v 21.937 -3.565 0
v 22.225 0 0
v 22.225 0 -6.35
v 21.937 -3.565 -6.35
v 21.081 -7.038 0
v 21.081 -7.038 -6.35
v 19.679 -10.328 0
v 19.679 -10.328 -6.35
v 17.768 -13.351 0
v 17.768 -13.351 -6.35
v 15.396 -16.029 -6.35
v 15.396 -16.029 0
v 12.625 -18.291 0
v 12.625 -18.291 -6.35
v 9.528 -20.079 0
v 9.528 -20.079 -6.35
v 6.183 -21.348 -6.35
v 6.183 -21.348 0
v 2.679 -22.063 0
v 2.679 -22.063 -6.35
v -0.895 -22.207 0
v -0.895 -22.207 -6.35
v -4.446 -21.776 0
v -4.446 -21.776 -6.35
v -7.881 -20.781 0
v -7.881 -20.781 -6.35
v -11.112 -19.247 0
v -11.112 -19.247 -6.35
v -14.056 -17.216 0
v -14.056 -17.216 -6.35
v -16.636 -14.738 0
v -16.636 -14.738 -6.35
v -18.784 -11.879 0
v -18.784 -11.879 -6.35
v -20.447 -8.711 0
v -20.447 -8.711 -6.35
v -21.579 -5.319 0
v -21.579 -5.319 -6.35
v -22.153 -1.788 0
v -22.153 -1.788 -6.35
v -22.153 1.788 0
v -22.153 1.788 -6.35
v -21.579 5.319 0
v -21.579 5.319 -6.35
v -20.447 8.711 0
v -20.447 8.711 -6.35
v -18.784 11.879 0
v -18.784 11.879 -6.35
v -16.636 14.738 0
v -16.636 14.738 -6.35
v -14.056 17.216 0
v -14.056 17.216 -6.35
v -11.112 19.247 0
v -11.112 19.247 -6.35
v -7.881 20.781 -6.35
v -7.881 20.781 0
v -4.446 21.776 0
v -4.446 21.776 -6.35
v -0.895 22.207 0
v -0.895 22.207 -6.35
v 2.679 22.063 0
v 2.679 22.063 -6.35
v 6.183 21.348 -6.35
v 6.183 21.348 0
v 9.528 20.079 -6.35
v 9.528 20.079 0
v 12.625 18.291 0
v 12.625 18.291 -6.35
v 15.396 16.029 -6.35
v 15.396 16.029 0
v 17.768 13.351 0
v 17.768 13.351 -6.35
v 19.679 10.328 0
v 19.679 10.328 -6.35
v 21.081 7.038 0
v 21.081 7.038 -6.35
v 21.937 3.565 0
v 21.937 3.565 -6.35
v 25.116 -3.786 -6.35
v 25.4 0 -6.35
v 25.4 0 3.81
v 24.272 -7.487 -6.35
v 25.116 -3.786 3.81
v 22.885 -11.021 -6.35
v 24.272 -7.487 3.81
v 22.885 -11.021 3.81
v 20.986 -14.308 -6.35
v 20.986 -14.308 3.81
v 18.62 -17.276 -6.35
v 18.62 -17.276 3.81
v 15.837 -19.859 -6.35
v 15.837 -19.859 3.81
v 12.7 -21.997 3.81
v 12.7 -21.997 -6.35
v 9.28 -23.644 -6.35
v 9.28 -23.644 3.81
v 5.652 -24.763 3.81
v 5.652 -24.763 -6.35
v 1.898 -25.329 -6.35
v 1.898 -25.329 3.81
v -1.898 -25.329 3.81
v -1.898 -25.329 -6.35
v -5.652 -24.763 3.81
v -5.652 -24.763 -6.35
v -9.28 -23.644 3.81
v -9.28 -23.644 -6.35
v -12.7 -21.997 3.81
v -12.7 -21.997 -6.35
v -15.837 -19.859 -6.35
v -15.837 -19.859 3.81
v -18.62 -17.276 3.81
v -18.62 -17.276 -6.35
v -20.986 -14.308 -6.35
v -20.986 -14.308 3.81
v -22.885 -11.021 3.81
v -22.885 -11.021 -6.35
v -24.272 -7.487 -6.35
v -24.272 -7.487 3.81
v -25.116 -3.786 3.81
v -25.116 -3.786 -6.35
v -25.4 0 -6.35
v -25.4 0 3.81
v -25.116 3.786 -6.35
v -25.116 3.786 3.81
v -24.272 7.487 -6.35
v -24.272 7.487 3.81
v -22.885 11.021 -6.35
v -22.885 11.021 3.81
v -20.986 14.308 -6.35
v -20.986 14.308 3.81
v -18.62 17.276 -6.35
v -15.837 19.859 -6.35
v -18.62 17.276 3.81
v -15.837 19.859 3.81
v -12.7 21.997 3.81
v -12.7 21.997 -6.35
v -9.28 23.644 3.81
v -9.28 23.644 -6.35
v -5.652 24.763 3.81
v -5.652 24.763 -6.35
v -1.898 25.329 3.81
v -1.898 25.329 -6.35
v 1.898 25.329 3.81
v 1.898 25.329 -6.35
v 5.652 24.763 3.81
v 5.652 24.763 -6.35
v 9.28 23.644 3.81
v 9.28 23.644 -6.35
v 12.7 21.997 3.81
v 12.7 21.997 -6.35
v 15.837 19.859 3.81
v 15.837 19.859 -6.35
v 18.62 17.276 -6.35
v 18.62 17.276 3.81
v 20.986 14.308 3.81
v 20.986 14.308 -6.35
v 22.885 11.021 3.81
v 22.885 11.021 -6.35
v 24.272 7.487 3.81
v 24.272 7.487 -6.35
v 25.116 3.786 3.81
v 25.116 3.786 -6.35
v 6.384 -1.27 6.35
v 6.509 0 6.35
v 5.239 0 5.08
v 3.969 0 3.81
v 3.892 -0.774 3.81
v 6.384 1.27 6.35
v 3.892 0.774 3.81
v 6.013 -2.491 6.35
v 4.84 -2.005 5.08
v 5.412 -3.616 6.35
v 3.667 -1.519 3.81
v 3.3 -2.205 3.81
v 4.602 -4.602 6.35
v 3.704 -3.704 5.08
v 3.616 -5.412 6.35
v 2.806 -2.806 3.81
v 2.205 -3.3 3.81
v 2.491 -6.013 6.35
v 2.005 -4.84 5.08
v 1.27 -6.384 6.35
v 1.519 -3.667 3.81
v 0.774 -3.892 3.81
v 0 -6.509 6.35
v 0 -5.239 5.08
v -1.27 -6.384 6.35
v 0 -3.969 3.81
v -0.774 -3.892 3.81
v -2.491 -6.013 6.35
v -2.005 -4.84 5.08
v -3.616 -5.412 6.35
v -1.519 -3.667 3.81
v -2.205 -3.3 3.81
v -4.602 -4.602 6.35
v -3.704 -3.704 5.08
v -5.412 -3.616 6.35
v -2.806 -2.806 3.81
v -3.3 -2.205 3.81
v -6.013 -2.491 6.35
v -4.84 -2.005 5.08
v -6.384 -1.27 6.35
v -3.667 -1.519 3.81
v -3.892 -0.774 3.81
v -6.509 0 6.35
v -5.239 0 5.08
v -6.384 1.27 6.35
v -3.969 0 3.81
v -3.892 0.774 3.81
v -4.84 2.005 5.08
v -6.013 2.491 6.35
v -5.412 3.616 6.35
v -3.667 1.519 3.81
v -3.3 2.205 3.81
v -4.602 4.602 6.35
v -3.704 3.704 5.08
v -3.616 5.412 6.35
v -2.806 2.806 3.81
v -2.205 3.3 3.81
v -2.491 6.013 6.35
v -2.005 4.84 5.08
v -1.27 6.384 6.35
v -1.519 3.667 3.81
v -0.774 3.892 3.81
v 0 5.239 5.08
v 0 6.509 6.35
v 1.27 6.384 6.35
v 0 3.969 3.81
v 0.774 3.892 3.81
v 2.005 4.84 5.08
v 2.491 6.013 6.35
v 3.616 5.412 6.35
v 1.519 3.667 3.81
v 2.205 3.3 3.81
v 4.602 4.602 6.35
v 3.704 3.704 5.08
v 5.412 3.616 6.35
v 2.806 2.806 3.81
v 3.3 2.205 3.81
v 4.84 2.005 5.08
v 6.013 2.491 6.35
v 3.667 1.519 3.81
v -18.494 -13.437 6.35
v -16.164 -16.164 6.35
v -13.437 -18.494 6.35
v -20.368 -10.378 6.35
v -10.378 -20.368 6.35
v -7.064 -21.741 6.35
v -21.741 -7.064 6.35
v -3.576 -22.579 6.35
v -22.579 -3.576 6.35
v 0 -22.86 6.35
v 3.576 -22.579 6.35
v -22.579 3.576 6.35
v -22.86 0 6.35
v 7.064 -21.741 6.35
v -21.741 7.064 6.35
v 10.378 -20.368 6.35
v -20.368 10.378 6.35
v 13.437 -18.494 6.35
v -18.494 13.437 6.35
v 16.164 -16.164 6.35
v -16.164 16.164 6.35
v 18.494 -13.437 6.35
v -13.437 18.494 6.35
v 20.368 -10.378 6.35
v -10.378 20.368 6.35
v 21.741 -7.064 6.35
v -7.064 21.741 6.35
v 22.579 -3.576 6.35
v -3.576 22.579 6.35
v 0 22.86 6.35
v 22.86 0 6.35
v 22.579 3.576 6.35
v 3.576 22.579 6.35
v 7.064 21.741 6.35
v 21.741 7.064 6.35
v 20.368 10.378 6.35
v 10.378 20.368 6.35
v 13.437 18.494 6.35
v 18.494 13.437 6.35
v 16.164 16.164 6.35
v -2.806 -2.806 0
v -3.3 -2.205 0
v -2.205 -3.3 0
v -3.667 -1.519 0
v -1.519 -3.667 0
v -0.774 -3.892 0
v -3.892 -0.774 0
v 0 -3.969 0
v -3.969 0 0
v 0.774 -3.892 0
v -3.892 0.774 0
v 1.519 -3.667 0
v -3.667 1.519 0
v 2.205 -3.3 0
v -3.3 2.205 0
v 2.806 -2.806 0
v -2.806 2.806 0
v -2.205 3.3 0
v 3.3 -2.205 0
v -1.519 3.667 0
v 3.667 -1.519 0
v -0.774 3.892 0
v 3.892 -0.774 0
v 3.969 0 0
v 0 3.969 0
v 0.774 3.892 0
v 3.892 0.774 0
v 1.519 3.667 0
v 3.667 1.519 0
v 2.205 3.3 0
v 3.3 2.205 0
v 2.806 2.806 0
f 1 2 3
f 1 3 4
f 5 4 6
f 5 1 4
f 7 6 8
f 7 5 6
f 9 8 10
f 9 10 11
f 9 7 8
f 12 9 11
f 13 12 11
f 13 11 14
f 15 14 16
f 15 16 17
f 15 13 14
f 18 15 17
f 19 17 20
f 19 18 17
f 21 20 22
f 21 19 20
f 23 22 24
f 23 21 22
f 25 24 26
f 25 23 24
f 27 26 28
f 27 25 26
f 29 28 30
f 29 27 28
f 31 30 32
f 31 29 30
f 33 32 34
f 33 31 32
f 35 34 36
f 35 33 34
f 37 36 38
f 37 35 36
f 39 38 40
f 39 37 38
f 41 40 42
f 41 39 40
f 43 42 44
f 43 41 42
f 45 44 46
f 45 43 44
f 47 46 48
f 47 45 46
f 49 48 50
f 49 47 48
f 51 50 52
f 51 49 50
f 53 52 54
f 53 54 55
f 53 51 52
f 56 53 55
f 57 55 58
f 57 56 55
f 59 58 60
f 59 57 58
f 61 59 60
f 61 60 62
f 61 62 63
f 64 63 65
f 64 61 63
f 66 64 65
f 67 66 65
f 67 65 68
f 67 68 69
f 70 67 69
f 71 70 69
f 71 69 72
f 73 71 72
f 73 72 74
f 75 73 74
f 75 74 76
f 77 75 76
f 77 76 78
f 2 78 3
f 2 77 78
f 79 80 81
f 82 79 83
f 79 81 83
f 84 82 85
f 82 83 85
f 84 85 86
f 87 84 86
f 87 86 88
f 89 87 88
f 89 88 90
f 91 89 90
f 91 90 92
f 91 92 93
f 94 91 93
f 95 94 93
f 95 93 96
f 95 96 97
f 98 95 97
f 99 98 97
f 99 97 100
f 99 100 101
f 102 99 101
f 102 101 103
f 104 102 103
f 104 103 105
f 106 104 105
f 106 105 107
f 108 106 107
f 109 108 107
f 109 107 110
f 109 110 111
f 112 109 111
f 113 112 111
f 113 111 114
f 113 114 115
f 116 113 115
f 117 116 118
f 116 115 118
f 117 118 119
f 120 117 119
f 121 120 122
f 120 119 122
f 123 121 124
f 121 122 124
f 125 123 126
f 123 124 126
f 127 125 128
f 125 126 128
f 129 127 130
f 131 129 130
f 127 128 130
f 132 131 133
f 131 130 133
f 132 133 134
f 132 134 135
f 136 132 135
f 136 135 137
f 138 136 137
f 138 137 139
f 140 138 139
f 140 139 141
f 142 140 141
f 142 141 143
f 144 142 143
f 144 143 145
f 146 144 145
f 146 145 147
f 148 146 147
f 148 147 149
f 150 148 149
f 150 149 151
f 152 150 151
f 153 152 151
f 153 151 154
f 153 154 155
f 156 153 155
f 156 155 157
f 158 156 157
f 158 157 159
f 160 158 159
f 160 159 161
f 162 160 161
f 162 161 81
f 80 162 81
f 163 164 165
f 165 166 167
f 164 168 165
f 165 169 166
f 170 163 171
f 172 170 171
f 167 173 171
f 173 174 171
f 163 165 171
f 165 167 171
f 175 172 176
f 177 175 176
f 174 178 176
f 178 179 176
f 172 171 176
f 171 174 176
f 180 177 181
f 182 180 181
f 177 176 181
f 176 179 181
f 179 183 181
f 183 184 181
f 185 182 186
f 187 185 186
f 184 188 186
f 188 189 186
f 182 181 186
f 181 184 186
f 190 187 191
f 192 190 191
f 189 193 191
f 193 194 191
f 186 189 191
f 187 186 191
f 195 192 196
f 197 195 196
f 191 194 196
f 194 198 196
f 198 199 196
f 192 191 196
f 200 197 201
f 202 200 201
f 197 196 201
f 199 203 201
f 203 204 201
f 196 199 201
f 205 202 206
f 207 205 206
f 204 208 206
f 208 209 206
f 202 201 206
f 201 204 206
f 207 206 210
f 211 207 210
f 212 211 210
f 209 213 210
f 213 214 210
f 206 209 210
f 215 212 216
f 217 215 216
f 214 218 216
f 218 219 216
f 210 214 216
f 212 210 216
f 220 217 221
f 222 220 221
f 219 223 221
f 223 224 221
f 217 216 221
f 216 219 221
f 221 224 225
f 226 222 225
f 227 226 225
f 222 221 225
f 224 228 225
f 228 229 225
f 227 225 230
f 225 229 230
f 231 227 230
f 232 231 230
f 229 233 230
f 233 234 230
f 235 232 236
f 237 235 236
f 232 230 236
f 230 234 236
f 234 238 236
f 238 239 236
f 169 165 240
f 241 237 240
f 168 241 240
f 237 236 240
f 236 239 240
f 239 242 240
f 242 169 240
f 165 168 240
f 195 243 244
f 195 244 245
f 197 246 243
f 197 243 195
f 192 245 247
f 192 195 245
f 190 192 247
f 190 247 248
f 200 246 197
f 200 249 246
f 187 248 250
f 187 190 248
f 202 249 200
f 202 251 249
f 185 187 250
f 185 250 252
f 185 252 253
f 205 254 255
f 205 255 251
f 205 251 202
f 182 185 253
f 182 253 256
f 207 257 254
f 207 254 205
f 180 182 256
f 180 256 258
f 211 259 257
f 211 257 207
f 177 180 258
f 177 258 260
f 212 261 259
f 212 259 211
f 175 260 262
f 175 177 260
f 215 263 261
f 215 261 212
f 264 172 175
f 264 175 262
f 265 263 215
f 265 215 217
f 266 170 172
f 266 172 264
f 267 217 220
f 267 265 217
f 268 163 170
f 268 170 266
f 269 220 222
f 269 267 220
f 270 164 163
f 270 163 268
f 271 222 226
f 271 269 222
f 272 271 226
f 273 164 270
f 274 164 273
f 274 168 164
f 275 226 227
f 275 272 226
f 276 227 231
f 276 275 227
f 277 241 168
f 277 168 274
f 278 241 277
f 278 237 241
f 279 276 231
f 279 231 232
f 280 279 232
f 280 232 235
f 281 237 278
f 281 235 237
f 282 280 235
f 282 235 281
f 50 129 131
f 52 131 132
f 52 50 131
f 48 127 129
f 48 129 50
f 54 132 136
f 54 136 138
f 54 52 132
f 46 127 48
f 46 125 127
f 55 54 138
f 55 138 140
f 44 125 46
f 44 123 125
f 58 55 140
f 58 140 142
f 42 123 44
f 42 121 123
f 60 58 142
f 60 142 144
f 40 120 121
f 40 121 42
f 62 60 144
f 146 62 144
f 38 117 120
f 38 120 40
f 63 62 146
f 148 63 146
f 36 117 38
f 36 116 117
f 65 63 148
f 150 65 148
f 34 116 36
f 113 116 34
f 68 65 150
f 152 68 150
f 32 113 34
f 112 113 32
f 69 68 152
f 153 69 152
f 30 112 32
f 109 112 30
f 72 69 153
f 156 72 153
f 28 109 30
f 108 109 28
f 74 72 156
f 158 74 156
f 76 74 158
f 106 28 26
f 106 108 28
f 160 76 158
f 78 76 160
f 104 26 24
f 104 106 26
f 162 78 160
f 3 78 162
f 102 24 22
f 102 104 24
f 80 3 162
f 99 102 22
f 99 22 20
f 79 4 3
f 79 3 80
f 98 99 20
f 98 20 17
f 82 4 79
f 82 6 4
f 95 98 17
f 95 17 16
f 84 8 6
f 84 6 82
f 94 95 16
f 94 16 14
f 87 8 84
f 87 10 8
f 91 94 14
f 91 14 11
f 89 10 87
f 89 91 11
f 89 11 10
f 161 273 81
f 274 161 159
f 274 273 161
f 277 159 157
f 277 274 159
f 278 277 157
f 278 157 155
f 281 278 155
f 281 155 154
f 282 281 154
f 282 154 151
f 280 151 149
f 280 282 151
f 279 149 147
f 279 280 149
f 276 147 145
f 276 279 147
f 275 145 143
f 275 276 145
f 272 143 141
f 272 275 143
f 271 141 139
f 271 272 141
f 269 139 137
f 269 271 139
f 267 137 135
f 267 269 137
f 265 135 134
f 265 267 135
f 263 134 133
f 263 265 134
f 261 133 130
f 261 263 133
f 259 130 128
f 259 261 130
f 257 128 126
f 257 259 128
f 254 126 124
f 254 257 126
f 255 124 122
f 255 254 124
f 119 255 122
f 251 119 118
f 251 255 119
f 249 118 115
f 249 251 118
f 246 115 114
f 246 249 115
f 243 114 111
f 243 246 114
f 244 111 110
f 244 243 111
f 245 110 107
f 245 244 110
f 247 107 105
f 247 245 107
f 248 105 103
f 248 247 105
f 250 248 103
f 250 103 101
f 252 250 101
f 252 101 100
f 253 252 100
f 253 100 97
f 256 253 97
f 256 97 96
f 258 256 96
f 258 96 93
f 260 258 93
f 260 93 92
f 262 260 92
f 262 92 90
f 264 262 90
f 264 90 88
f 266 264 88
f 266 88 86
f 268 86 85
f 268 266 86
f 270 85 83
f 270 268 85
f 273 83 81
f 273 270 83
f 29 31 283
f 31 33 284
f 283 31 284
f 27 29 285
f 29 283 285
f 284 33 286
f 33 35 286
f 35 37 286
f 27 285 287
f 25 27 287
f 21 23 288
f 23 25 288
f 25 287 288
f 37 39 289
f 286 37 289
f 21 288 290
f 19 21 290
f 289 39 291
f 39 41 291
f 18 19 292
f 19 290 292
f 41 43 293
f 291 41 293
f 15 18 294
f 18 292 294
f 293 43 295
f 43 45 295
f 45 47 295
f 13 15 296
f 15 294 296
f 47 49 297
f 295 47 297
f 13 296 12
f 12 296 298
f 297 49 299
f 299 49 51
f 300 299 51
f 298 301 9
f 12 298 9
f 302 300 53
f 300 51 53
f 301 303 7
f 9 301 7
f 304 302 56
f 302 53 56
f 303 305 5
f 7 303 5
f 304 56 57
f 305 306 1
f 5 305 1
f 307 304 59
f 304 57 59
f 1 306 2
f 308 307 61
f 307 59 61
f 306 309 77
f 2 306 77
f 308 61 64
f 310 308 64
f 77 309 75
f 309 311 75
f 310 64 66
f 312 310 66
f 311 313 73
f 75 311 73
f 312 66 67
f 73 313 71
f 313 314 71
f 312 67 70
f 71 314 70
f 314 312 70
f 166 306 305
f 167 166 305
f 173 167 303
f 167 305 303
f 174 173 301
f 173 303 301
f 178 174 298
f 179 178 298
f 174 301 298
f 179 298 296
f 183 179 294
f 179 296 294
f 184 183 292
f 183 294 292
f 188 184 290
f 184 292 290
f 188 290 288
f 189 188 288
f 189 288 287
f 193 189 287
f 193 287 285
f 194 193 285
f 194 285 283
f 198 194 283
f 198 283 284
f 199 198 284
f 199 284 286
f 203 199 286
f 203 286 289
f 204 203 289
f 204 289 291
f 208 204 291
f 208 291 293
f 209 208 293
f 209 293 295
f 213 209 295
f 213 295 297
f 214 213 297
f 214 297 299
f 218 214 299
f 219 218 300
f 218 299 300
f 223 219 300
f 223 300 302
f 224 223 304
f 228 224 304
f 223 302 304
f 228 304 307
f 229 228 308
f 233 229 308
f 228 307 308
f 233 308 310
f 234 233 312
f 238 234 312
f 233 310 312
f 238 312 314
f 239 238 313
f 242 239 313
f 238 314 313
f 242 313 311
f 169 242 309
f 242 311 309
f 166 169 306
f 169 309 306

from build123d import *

# Parameters (mm, degrees)
F0_R     = 25.4
F1_DEPTH = 6.35
F2_R     = 3.96875
F3_DEPTH = 25.4
F2_R_2   = 25.4
F2_R_3   = 22.225
F4_DEPTH = 6.35
F5_SIZE  = 2.54


with BuildPart() as f1:
    # F0 (on Top) → F1 (new body)
    with BuildSketch(Plane.XY):
        Circle(F0_R)
    extrude(amount=F1_DEPTH)

    # F2 (on face) → F3 (cut)
    with BuildSketch(Plane(origin=(0, 0, 0), x_dir=(1, 0, 0), z_dir=(0, 0, -1))):
        Circle(F2_R)
    extrude(amount=-F3_DEPTH, mode=Mode.SUBTRACT)

    # F2 (on face) → F4 (join)
    with BuildSketch(Plane(origin=(0, 0, 0), x_dir=(1, 0, 0), z_dir=(0, 0, -1))):
        Circle(F2_R_2)
        Circle(F2_R_3, mode=Mode.SUBTRACT)
    extrude(amount=F4_DEPTH)

    # F5
    f5_edges = [f1.edges().sort_by_distance(p)[0] for p in [
        (-3.96875, 0, 6.35),
        (-25.4, 0, 6.35),
    ]]
    chamfer(f5_edges, length=F5_SIZE)


solid = f1.part
